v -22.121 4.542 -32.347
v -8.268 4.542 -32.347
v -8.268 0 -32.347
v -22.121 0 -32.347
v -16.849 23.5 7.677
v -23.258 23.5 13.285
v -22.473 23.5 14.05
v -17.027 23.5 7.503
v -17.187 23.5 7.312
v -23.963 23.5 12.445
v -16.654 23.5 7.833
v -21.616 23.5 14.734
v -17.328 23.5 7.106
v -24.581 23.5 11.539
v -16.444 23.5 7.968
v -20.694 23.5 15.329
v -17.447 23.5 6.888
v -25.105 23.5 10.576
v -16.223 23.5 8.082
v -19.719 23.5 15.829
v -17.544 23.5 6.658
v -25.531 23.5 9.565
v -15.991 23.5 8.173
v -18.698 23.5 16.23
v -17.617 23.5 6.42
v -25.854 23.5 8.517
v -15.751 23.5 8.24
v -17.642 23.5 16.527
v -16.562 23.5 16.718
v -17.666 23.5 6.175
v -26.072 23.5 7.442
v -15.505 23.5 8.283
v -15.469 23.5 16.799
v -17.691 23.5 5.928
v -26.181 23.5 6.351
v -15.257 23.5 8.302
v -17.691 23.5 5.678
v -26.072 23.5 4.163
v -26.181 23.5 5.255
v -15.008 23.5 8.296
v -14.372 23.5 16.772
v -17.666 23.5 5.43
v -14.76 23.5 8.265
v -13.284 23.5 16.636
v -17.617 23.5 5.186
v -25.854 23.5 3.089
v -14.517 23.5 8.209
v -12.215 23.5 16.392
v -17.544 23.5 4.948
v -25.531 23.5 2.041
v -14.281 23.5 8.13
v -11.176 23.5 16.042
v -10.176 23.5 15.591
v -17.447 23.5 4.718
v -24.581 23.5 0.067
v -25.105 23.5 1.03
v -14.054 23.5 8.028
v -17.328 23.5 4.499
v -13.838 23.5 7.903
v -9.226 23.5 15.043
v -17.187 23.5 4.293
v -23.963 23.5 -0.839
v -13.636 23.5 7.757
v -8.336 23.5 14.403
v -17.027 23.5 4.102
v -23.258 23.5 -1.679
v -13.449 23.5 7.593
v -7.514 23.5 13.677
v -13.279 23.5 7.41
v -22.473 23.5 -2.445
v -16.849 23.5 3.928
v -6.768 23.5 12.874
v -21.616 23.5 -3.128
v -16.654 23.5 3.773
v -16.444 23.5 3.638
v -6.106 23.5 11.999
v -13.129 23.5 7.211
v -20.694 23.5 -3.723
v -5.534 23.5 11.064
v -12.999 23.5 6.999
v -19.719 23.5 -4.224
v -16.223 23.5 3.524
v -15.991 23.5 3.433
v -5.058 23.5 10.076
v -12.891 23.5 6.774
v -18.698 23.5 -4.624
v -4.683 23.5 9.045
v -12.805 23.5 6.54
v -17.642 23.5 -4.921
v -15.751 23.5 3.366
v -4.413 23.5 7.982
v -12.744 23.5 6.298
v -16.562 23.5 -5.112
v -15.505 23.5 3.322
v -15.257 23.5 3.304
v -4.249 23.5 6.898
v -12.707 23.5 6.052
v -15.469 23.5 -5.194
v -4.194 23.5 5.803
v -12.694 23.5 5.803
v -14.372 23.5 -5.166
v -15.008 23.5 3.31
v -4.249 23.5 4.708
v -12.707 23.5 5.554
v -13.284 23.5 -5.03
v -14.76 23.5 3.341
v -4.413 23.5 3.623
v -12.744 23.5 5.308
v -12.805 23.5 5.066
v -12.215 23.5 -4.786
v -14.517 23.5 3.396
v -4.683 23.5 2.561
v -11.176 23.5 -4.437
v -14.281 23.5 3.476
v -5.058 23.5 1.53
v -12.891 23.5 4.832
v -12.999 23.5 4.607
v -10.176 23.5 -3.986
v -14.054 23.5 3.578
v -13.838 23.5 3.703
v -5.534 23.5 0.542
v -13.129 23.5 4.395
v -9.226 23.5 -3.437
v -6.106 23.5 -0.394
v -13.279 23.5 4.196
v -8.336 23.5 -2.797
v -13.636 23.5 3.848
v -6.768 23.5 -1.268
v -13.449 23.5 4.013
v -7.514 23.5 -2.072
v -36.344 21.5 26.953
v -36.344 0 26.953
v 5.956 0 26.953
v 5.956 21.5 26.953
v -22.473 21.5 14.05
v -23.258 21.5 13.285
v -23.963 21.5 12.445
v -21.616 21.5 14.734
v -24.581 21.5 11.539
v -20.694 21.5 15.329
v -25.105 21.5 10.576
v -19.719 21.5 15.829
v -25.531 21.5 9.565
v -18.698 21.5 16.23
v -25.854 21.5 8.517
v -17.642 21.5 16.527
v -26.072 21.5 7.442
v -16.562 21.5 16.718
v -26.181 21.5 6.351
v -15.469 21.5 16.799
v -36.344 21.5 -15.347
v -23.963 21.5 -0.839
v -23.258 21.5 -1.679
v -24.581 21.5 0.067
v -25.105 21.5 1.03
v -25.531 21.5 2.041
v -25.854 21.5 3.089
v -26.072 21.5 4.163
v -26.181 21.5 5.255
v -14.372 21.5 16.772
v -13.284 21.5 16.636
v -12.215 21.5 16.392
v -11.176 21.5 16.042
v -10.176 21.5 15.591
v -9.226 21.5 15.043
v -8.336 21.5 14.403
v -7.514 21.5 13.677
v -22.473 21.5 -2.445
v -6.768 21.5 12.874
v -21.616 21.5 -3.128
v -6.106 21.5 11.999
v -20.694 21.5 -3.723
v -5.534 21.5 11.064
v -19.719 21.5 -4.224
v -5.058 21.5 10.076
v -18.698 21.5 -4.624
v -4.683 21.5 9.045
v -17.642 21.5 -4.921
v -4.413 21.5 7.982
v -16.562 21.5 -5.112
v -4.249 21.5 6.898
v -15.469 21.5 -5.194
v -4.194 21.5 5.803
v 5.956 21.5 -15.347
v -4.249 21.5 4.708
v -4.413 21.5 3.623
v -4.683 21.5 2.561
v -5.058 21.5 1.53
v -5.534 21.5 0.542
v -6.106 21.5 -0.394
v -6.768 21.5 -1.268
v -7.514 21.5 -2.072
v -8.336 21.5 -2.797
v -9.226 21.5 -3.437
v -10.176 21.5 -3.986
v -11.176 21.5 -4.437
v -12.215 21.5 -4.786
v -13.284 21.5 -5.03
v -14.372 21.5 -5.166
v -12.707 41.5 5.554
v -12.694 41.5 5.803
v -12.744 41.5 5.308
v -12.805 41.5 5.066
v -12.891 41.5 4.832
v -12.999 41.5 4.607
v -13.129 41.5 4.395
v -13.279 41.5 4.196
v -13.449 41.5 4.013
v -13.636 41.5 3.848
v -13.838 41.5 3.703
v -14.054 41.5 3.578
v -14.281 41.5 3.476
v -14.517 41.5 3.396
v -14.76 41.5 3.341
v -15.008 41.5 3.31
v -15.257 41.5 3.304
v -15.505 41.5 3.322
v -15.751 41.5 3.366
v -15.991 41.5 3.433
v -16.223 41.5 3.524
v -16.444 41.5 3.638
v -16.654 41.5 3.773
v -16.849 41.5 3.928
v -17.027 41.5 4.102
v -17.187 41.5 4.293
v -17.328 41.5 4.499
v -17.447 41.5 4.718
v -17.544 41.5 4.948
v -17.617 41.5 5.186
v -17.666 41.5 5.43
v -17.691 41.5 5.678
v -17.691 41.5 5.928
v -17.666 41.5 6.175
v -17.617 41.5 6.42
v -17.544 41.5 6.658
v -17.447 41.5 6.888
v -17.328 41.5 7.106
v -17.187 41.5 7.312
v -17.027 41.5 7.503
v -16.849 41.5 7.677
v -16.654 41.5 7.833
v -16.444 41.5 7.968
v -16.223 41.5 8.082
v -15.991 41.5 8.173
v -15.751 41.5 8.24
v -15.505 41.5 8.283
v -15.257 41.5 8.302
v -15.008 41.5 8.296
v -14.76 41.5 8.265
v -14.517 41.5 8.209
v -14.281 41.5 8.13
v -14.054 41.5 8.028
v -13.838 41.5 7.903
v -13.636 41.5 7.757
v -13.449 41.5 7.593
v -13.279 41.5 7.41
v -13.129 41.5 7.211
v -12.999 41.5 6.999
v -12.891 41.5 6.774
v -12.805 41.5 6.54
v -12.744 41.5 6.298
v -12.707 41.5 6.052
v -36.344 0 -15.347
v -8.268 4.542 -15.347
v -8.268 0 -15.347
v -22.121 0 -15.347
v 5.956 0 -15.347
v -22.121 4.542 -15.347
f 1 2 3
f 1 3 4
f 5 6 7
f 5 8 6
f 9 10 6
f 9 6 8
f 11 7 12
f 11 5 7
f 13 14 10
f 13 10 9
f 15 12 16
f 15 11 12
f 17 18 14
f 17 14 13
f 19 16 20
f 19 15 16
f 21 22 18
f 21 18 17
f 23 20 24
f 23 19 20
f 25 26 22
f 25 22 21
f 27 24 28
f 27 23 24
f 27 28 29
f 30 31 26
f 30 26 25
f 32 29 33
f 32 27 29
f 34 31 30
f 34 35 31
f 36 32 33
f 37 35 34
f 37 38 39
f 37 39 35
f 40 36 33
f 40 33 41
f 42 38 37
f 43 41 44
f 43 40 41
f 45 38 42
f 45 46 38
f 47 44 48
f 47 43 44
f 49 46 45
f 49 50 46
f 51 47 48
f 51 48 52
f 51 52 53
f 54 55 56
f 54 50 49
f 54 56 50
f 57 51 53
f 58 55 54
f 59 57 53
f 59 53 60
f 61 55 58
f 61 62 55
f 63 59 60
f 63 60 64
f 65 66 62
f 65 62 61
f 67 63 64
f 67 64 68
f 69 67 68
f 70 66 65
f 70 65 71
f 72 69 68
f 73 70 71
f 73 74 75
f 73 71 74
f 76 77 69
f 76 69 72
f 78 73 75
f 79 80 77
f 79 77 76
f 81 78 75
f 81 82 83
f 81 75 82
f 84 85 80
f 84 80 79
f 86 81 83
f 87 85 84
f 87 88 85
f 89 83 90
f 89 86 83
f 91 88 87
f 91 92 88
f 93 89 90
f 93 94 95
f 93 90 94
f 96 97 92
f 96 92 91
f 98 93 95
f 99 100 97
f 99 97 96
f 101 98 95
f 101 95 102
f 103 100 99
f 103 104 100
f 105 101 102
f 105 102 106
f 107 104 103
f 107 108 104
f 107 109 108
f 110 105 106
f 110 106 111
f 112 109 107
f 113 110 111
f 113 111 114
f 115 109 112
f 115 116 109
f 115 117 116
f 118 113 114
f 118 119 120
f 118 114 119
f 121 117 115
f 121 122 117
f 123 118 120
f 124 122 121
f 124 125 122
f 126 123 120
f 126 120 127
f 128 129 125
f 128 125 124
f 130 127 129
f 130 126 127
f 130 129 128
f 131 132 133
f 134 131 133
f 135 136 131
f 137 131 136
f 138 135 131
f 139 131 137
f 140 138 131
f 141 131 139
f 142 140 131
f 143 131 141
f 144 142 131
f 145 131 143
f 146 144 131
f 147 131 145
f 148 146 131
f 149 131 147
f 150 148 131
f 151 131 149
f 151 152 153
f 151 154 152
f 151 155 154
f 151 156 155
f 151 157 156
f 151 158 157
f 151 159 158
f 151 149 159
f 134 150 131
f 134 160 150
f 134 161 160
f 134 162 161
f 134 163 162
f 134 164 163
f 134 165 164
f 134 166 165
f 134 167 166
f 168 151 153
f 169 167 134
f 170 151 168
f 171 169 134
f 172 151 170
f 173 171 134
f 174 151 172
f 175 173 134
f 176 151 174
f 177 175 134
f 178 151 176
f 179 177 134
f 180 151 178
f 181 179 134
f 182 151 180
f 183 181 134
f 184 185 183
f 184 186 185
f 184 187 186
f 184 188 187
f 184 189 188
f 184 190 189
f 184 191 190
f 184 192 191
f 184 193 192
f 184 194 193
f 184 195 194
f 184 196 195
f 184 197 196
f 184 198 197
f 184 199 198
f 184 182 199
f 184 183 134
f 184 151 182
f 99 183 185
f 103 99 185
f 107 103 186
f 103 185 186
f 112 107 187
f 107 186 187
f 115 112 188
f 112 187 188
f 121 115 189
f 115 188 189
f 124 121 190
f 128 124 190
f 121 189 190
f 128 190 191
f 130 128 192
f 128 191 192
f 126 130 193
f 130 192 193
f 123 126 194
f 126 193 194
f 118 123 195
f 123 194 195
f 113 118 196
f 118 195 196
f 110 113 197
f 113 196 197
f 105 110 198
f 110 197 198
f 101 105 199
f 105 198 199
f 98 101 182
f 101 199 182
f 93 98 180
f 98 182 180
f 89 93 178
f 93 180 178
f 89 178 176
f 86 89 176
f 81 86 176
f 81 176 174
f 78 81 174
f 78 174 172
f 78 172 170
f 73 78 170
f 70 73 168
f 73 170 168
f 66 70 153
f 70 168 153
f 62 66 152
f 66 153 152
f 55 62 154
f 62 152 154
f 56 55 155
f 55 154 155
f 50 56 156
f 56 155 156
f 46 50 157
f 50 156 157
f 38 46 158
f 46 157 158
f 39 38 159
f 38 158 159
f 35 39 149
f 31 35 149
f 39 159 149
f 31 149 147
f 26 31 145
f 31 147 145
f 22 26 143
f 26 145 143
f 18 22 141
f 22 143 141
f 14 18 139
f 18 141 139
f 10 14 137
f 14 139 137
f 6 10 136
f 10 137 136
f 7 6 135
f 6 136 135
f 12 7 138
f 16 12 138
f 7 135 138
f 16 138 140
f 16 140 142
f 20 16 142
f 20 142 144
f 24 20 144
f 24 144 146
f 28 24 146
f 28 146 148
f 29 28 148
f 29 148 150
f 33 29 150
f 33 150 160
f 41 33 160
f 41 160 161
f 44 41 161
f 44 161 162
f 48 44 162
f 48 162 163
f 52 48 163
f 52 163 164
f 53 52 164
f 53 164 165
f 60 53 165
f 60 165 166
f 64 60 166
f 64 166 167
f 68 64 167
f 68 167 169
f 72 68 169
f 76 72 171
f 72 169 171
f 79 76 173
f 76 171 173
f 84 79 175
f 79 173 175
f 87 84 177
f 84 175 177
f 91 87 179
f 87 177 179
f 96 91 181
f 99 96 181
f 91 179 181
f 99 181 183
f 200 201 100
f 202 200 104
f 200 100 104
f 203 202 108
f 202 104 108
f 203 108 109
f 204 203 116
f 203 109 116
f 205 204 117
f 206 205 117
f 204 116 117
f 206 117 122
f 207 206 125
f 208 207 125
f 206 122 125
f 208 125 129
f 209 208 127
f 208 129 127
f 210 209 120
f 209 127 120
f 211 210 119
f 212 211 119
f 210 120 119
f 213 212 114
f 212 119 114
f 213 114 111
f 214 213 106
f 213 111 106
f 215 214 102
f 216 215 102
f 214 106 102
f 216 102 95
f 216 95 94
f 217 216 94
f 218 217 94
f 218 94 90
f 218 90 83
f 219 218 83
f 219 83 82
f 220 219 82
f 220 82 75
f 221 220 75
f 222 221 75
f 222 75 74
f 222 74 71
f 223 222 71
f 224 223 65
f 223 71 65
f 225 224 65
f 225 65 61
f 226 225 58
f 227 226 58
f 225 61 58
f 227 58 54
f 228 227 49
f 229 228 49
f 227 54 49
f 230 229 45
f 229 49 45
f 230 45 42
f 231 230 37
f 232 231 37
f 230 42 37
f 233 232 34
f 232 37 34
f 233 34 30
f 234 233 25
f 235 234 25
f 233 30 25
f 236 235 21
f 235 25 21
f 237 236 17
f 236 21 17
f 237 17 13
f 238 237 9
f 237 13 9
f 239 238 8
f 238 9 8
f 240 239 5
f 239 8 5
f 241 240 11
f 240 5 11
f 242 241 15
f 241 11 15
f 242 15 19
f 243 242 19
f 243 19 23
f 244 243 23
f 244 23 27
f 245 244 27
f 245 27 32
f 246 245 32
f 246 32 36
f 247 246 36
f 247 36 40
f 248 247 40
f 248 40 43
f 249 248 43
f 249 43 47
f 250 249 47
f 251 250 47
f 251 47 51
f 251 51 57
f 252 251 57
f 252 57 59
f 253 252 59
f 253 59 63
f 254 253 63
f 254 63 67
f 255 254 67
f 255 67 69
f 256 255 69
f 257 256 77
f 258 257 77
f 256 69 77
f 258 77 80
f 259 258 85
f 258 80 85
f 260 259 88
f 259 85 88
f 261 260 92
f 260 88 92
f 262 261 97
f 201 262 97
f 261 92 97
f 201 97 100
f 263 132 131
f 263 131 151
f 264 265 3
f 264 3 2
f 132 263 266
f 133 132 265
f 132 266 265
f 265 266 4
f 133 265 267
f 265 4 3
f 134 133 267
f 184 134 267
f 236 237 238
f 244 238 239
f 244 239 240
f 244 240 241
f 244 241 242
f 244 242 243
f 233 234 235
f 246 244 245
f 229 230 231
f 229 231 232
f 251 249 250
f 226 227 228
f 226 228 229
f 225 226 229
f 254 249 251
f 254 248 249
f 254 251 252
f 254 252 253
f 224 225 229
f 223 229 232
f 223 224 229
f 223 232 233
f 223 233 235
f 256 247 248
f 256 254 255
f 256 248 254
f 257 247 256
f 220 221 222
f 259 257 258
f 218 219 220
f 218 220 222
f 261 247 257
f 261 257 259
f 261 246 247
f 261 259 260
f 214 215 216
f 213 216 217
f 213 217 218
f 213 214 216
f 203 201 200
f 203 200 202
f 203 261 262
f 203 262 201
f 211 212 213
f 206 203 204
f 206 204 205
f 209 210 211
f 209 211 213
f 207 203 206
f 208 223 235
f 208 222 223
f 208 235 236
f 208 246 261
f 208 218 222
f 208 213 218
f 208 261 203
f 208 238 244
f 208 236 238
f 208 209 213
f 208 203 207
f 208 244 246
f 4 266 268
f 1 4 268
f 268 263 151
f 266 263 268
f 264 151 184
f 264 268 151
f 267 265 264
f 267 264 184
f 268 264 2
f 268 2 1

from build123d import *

# Parameters (mm, degrees)
SKETCH1_W           = 42.3
SKETCH1_H           = 42.3
BOSS_EXTRUDE1_DEPTH = 21.5
SKETCH2_R           = 11
BOSS_EXTRUDE2_DEPTH = 2
SKETCH3_R           = 2.5
BOSS_EXTRUDE3_DEPTH = 18
SKETCH4_W           = 13.852605362
SKETCH4_H           = 4.542451726
BOSS_EXTRUDE4_DEPTH = 17


with BuildPart() as part:
    # Sketch1 → Boss-Extrude1 (new body)
    with BuildSketch(Plane(origin=(0, 0, 0), x_dir=(1, 0, 0), z_dir=(0, 1, 0))):
        with Locations((-15.194404332, -5.802888087)):
            Rectangle(SKETCH1_W, SKETCH1_H)
    extrude(amount=BOSS_EXTRUDE1_DEPTH)

    # Sketch2 → Boss-Extrude2 (add)
    with BuildSketch(Plane(origin=(0, 21.5, 0), x_dir=(1, 0, 0), z_dir=(0, 1, 0))):
        with Locations((-15.194404332, -5.802888087)):
            Circle(SKETCH2_R)
    extrude(amount=BOSS_EXTRUDE2_DEPTH)

    # Sketch3 → Boss-Extrude3 (add)
    with BuildSketch(Plane(origin=(0, 23.5, 0), x_dir=(1, 0, 0), z_dir=(0, 1, 0))):
        with Locations((-15.194404332, -5.802888087)):
            Circle(SKETCH3_R)
    extrude(amount=BOSS_EXTRUDE3_DEPTH)

    # Sketch4 → Boss-Extrude4 (add)
    with BuildSketch(Plane(origin=(0, 0, -15.347111913), x_dir=(-1, 0, 0), z_dir=(0, 0, -1))):
        with Locations((15.194404332, 2.271225863)):
            Rectangle(SKETCH4_W, SKETCH4_H)
    extrude(amount=BOSS_EXTRUDE4_DEPTH)


solid = part.part
